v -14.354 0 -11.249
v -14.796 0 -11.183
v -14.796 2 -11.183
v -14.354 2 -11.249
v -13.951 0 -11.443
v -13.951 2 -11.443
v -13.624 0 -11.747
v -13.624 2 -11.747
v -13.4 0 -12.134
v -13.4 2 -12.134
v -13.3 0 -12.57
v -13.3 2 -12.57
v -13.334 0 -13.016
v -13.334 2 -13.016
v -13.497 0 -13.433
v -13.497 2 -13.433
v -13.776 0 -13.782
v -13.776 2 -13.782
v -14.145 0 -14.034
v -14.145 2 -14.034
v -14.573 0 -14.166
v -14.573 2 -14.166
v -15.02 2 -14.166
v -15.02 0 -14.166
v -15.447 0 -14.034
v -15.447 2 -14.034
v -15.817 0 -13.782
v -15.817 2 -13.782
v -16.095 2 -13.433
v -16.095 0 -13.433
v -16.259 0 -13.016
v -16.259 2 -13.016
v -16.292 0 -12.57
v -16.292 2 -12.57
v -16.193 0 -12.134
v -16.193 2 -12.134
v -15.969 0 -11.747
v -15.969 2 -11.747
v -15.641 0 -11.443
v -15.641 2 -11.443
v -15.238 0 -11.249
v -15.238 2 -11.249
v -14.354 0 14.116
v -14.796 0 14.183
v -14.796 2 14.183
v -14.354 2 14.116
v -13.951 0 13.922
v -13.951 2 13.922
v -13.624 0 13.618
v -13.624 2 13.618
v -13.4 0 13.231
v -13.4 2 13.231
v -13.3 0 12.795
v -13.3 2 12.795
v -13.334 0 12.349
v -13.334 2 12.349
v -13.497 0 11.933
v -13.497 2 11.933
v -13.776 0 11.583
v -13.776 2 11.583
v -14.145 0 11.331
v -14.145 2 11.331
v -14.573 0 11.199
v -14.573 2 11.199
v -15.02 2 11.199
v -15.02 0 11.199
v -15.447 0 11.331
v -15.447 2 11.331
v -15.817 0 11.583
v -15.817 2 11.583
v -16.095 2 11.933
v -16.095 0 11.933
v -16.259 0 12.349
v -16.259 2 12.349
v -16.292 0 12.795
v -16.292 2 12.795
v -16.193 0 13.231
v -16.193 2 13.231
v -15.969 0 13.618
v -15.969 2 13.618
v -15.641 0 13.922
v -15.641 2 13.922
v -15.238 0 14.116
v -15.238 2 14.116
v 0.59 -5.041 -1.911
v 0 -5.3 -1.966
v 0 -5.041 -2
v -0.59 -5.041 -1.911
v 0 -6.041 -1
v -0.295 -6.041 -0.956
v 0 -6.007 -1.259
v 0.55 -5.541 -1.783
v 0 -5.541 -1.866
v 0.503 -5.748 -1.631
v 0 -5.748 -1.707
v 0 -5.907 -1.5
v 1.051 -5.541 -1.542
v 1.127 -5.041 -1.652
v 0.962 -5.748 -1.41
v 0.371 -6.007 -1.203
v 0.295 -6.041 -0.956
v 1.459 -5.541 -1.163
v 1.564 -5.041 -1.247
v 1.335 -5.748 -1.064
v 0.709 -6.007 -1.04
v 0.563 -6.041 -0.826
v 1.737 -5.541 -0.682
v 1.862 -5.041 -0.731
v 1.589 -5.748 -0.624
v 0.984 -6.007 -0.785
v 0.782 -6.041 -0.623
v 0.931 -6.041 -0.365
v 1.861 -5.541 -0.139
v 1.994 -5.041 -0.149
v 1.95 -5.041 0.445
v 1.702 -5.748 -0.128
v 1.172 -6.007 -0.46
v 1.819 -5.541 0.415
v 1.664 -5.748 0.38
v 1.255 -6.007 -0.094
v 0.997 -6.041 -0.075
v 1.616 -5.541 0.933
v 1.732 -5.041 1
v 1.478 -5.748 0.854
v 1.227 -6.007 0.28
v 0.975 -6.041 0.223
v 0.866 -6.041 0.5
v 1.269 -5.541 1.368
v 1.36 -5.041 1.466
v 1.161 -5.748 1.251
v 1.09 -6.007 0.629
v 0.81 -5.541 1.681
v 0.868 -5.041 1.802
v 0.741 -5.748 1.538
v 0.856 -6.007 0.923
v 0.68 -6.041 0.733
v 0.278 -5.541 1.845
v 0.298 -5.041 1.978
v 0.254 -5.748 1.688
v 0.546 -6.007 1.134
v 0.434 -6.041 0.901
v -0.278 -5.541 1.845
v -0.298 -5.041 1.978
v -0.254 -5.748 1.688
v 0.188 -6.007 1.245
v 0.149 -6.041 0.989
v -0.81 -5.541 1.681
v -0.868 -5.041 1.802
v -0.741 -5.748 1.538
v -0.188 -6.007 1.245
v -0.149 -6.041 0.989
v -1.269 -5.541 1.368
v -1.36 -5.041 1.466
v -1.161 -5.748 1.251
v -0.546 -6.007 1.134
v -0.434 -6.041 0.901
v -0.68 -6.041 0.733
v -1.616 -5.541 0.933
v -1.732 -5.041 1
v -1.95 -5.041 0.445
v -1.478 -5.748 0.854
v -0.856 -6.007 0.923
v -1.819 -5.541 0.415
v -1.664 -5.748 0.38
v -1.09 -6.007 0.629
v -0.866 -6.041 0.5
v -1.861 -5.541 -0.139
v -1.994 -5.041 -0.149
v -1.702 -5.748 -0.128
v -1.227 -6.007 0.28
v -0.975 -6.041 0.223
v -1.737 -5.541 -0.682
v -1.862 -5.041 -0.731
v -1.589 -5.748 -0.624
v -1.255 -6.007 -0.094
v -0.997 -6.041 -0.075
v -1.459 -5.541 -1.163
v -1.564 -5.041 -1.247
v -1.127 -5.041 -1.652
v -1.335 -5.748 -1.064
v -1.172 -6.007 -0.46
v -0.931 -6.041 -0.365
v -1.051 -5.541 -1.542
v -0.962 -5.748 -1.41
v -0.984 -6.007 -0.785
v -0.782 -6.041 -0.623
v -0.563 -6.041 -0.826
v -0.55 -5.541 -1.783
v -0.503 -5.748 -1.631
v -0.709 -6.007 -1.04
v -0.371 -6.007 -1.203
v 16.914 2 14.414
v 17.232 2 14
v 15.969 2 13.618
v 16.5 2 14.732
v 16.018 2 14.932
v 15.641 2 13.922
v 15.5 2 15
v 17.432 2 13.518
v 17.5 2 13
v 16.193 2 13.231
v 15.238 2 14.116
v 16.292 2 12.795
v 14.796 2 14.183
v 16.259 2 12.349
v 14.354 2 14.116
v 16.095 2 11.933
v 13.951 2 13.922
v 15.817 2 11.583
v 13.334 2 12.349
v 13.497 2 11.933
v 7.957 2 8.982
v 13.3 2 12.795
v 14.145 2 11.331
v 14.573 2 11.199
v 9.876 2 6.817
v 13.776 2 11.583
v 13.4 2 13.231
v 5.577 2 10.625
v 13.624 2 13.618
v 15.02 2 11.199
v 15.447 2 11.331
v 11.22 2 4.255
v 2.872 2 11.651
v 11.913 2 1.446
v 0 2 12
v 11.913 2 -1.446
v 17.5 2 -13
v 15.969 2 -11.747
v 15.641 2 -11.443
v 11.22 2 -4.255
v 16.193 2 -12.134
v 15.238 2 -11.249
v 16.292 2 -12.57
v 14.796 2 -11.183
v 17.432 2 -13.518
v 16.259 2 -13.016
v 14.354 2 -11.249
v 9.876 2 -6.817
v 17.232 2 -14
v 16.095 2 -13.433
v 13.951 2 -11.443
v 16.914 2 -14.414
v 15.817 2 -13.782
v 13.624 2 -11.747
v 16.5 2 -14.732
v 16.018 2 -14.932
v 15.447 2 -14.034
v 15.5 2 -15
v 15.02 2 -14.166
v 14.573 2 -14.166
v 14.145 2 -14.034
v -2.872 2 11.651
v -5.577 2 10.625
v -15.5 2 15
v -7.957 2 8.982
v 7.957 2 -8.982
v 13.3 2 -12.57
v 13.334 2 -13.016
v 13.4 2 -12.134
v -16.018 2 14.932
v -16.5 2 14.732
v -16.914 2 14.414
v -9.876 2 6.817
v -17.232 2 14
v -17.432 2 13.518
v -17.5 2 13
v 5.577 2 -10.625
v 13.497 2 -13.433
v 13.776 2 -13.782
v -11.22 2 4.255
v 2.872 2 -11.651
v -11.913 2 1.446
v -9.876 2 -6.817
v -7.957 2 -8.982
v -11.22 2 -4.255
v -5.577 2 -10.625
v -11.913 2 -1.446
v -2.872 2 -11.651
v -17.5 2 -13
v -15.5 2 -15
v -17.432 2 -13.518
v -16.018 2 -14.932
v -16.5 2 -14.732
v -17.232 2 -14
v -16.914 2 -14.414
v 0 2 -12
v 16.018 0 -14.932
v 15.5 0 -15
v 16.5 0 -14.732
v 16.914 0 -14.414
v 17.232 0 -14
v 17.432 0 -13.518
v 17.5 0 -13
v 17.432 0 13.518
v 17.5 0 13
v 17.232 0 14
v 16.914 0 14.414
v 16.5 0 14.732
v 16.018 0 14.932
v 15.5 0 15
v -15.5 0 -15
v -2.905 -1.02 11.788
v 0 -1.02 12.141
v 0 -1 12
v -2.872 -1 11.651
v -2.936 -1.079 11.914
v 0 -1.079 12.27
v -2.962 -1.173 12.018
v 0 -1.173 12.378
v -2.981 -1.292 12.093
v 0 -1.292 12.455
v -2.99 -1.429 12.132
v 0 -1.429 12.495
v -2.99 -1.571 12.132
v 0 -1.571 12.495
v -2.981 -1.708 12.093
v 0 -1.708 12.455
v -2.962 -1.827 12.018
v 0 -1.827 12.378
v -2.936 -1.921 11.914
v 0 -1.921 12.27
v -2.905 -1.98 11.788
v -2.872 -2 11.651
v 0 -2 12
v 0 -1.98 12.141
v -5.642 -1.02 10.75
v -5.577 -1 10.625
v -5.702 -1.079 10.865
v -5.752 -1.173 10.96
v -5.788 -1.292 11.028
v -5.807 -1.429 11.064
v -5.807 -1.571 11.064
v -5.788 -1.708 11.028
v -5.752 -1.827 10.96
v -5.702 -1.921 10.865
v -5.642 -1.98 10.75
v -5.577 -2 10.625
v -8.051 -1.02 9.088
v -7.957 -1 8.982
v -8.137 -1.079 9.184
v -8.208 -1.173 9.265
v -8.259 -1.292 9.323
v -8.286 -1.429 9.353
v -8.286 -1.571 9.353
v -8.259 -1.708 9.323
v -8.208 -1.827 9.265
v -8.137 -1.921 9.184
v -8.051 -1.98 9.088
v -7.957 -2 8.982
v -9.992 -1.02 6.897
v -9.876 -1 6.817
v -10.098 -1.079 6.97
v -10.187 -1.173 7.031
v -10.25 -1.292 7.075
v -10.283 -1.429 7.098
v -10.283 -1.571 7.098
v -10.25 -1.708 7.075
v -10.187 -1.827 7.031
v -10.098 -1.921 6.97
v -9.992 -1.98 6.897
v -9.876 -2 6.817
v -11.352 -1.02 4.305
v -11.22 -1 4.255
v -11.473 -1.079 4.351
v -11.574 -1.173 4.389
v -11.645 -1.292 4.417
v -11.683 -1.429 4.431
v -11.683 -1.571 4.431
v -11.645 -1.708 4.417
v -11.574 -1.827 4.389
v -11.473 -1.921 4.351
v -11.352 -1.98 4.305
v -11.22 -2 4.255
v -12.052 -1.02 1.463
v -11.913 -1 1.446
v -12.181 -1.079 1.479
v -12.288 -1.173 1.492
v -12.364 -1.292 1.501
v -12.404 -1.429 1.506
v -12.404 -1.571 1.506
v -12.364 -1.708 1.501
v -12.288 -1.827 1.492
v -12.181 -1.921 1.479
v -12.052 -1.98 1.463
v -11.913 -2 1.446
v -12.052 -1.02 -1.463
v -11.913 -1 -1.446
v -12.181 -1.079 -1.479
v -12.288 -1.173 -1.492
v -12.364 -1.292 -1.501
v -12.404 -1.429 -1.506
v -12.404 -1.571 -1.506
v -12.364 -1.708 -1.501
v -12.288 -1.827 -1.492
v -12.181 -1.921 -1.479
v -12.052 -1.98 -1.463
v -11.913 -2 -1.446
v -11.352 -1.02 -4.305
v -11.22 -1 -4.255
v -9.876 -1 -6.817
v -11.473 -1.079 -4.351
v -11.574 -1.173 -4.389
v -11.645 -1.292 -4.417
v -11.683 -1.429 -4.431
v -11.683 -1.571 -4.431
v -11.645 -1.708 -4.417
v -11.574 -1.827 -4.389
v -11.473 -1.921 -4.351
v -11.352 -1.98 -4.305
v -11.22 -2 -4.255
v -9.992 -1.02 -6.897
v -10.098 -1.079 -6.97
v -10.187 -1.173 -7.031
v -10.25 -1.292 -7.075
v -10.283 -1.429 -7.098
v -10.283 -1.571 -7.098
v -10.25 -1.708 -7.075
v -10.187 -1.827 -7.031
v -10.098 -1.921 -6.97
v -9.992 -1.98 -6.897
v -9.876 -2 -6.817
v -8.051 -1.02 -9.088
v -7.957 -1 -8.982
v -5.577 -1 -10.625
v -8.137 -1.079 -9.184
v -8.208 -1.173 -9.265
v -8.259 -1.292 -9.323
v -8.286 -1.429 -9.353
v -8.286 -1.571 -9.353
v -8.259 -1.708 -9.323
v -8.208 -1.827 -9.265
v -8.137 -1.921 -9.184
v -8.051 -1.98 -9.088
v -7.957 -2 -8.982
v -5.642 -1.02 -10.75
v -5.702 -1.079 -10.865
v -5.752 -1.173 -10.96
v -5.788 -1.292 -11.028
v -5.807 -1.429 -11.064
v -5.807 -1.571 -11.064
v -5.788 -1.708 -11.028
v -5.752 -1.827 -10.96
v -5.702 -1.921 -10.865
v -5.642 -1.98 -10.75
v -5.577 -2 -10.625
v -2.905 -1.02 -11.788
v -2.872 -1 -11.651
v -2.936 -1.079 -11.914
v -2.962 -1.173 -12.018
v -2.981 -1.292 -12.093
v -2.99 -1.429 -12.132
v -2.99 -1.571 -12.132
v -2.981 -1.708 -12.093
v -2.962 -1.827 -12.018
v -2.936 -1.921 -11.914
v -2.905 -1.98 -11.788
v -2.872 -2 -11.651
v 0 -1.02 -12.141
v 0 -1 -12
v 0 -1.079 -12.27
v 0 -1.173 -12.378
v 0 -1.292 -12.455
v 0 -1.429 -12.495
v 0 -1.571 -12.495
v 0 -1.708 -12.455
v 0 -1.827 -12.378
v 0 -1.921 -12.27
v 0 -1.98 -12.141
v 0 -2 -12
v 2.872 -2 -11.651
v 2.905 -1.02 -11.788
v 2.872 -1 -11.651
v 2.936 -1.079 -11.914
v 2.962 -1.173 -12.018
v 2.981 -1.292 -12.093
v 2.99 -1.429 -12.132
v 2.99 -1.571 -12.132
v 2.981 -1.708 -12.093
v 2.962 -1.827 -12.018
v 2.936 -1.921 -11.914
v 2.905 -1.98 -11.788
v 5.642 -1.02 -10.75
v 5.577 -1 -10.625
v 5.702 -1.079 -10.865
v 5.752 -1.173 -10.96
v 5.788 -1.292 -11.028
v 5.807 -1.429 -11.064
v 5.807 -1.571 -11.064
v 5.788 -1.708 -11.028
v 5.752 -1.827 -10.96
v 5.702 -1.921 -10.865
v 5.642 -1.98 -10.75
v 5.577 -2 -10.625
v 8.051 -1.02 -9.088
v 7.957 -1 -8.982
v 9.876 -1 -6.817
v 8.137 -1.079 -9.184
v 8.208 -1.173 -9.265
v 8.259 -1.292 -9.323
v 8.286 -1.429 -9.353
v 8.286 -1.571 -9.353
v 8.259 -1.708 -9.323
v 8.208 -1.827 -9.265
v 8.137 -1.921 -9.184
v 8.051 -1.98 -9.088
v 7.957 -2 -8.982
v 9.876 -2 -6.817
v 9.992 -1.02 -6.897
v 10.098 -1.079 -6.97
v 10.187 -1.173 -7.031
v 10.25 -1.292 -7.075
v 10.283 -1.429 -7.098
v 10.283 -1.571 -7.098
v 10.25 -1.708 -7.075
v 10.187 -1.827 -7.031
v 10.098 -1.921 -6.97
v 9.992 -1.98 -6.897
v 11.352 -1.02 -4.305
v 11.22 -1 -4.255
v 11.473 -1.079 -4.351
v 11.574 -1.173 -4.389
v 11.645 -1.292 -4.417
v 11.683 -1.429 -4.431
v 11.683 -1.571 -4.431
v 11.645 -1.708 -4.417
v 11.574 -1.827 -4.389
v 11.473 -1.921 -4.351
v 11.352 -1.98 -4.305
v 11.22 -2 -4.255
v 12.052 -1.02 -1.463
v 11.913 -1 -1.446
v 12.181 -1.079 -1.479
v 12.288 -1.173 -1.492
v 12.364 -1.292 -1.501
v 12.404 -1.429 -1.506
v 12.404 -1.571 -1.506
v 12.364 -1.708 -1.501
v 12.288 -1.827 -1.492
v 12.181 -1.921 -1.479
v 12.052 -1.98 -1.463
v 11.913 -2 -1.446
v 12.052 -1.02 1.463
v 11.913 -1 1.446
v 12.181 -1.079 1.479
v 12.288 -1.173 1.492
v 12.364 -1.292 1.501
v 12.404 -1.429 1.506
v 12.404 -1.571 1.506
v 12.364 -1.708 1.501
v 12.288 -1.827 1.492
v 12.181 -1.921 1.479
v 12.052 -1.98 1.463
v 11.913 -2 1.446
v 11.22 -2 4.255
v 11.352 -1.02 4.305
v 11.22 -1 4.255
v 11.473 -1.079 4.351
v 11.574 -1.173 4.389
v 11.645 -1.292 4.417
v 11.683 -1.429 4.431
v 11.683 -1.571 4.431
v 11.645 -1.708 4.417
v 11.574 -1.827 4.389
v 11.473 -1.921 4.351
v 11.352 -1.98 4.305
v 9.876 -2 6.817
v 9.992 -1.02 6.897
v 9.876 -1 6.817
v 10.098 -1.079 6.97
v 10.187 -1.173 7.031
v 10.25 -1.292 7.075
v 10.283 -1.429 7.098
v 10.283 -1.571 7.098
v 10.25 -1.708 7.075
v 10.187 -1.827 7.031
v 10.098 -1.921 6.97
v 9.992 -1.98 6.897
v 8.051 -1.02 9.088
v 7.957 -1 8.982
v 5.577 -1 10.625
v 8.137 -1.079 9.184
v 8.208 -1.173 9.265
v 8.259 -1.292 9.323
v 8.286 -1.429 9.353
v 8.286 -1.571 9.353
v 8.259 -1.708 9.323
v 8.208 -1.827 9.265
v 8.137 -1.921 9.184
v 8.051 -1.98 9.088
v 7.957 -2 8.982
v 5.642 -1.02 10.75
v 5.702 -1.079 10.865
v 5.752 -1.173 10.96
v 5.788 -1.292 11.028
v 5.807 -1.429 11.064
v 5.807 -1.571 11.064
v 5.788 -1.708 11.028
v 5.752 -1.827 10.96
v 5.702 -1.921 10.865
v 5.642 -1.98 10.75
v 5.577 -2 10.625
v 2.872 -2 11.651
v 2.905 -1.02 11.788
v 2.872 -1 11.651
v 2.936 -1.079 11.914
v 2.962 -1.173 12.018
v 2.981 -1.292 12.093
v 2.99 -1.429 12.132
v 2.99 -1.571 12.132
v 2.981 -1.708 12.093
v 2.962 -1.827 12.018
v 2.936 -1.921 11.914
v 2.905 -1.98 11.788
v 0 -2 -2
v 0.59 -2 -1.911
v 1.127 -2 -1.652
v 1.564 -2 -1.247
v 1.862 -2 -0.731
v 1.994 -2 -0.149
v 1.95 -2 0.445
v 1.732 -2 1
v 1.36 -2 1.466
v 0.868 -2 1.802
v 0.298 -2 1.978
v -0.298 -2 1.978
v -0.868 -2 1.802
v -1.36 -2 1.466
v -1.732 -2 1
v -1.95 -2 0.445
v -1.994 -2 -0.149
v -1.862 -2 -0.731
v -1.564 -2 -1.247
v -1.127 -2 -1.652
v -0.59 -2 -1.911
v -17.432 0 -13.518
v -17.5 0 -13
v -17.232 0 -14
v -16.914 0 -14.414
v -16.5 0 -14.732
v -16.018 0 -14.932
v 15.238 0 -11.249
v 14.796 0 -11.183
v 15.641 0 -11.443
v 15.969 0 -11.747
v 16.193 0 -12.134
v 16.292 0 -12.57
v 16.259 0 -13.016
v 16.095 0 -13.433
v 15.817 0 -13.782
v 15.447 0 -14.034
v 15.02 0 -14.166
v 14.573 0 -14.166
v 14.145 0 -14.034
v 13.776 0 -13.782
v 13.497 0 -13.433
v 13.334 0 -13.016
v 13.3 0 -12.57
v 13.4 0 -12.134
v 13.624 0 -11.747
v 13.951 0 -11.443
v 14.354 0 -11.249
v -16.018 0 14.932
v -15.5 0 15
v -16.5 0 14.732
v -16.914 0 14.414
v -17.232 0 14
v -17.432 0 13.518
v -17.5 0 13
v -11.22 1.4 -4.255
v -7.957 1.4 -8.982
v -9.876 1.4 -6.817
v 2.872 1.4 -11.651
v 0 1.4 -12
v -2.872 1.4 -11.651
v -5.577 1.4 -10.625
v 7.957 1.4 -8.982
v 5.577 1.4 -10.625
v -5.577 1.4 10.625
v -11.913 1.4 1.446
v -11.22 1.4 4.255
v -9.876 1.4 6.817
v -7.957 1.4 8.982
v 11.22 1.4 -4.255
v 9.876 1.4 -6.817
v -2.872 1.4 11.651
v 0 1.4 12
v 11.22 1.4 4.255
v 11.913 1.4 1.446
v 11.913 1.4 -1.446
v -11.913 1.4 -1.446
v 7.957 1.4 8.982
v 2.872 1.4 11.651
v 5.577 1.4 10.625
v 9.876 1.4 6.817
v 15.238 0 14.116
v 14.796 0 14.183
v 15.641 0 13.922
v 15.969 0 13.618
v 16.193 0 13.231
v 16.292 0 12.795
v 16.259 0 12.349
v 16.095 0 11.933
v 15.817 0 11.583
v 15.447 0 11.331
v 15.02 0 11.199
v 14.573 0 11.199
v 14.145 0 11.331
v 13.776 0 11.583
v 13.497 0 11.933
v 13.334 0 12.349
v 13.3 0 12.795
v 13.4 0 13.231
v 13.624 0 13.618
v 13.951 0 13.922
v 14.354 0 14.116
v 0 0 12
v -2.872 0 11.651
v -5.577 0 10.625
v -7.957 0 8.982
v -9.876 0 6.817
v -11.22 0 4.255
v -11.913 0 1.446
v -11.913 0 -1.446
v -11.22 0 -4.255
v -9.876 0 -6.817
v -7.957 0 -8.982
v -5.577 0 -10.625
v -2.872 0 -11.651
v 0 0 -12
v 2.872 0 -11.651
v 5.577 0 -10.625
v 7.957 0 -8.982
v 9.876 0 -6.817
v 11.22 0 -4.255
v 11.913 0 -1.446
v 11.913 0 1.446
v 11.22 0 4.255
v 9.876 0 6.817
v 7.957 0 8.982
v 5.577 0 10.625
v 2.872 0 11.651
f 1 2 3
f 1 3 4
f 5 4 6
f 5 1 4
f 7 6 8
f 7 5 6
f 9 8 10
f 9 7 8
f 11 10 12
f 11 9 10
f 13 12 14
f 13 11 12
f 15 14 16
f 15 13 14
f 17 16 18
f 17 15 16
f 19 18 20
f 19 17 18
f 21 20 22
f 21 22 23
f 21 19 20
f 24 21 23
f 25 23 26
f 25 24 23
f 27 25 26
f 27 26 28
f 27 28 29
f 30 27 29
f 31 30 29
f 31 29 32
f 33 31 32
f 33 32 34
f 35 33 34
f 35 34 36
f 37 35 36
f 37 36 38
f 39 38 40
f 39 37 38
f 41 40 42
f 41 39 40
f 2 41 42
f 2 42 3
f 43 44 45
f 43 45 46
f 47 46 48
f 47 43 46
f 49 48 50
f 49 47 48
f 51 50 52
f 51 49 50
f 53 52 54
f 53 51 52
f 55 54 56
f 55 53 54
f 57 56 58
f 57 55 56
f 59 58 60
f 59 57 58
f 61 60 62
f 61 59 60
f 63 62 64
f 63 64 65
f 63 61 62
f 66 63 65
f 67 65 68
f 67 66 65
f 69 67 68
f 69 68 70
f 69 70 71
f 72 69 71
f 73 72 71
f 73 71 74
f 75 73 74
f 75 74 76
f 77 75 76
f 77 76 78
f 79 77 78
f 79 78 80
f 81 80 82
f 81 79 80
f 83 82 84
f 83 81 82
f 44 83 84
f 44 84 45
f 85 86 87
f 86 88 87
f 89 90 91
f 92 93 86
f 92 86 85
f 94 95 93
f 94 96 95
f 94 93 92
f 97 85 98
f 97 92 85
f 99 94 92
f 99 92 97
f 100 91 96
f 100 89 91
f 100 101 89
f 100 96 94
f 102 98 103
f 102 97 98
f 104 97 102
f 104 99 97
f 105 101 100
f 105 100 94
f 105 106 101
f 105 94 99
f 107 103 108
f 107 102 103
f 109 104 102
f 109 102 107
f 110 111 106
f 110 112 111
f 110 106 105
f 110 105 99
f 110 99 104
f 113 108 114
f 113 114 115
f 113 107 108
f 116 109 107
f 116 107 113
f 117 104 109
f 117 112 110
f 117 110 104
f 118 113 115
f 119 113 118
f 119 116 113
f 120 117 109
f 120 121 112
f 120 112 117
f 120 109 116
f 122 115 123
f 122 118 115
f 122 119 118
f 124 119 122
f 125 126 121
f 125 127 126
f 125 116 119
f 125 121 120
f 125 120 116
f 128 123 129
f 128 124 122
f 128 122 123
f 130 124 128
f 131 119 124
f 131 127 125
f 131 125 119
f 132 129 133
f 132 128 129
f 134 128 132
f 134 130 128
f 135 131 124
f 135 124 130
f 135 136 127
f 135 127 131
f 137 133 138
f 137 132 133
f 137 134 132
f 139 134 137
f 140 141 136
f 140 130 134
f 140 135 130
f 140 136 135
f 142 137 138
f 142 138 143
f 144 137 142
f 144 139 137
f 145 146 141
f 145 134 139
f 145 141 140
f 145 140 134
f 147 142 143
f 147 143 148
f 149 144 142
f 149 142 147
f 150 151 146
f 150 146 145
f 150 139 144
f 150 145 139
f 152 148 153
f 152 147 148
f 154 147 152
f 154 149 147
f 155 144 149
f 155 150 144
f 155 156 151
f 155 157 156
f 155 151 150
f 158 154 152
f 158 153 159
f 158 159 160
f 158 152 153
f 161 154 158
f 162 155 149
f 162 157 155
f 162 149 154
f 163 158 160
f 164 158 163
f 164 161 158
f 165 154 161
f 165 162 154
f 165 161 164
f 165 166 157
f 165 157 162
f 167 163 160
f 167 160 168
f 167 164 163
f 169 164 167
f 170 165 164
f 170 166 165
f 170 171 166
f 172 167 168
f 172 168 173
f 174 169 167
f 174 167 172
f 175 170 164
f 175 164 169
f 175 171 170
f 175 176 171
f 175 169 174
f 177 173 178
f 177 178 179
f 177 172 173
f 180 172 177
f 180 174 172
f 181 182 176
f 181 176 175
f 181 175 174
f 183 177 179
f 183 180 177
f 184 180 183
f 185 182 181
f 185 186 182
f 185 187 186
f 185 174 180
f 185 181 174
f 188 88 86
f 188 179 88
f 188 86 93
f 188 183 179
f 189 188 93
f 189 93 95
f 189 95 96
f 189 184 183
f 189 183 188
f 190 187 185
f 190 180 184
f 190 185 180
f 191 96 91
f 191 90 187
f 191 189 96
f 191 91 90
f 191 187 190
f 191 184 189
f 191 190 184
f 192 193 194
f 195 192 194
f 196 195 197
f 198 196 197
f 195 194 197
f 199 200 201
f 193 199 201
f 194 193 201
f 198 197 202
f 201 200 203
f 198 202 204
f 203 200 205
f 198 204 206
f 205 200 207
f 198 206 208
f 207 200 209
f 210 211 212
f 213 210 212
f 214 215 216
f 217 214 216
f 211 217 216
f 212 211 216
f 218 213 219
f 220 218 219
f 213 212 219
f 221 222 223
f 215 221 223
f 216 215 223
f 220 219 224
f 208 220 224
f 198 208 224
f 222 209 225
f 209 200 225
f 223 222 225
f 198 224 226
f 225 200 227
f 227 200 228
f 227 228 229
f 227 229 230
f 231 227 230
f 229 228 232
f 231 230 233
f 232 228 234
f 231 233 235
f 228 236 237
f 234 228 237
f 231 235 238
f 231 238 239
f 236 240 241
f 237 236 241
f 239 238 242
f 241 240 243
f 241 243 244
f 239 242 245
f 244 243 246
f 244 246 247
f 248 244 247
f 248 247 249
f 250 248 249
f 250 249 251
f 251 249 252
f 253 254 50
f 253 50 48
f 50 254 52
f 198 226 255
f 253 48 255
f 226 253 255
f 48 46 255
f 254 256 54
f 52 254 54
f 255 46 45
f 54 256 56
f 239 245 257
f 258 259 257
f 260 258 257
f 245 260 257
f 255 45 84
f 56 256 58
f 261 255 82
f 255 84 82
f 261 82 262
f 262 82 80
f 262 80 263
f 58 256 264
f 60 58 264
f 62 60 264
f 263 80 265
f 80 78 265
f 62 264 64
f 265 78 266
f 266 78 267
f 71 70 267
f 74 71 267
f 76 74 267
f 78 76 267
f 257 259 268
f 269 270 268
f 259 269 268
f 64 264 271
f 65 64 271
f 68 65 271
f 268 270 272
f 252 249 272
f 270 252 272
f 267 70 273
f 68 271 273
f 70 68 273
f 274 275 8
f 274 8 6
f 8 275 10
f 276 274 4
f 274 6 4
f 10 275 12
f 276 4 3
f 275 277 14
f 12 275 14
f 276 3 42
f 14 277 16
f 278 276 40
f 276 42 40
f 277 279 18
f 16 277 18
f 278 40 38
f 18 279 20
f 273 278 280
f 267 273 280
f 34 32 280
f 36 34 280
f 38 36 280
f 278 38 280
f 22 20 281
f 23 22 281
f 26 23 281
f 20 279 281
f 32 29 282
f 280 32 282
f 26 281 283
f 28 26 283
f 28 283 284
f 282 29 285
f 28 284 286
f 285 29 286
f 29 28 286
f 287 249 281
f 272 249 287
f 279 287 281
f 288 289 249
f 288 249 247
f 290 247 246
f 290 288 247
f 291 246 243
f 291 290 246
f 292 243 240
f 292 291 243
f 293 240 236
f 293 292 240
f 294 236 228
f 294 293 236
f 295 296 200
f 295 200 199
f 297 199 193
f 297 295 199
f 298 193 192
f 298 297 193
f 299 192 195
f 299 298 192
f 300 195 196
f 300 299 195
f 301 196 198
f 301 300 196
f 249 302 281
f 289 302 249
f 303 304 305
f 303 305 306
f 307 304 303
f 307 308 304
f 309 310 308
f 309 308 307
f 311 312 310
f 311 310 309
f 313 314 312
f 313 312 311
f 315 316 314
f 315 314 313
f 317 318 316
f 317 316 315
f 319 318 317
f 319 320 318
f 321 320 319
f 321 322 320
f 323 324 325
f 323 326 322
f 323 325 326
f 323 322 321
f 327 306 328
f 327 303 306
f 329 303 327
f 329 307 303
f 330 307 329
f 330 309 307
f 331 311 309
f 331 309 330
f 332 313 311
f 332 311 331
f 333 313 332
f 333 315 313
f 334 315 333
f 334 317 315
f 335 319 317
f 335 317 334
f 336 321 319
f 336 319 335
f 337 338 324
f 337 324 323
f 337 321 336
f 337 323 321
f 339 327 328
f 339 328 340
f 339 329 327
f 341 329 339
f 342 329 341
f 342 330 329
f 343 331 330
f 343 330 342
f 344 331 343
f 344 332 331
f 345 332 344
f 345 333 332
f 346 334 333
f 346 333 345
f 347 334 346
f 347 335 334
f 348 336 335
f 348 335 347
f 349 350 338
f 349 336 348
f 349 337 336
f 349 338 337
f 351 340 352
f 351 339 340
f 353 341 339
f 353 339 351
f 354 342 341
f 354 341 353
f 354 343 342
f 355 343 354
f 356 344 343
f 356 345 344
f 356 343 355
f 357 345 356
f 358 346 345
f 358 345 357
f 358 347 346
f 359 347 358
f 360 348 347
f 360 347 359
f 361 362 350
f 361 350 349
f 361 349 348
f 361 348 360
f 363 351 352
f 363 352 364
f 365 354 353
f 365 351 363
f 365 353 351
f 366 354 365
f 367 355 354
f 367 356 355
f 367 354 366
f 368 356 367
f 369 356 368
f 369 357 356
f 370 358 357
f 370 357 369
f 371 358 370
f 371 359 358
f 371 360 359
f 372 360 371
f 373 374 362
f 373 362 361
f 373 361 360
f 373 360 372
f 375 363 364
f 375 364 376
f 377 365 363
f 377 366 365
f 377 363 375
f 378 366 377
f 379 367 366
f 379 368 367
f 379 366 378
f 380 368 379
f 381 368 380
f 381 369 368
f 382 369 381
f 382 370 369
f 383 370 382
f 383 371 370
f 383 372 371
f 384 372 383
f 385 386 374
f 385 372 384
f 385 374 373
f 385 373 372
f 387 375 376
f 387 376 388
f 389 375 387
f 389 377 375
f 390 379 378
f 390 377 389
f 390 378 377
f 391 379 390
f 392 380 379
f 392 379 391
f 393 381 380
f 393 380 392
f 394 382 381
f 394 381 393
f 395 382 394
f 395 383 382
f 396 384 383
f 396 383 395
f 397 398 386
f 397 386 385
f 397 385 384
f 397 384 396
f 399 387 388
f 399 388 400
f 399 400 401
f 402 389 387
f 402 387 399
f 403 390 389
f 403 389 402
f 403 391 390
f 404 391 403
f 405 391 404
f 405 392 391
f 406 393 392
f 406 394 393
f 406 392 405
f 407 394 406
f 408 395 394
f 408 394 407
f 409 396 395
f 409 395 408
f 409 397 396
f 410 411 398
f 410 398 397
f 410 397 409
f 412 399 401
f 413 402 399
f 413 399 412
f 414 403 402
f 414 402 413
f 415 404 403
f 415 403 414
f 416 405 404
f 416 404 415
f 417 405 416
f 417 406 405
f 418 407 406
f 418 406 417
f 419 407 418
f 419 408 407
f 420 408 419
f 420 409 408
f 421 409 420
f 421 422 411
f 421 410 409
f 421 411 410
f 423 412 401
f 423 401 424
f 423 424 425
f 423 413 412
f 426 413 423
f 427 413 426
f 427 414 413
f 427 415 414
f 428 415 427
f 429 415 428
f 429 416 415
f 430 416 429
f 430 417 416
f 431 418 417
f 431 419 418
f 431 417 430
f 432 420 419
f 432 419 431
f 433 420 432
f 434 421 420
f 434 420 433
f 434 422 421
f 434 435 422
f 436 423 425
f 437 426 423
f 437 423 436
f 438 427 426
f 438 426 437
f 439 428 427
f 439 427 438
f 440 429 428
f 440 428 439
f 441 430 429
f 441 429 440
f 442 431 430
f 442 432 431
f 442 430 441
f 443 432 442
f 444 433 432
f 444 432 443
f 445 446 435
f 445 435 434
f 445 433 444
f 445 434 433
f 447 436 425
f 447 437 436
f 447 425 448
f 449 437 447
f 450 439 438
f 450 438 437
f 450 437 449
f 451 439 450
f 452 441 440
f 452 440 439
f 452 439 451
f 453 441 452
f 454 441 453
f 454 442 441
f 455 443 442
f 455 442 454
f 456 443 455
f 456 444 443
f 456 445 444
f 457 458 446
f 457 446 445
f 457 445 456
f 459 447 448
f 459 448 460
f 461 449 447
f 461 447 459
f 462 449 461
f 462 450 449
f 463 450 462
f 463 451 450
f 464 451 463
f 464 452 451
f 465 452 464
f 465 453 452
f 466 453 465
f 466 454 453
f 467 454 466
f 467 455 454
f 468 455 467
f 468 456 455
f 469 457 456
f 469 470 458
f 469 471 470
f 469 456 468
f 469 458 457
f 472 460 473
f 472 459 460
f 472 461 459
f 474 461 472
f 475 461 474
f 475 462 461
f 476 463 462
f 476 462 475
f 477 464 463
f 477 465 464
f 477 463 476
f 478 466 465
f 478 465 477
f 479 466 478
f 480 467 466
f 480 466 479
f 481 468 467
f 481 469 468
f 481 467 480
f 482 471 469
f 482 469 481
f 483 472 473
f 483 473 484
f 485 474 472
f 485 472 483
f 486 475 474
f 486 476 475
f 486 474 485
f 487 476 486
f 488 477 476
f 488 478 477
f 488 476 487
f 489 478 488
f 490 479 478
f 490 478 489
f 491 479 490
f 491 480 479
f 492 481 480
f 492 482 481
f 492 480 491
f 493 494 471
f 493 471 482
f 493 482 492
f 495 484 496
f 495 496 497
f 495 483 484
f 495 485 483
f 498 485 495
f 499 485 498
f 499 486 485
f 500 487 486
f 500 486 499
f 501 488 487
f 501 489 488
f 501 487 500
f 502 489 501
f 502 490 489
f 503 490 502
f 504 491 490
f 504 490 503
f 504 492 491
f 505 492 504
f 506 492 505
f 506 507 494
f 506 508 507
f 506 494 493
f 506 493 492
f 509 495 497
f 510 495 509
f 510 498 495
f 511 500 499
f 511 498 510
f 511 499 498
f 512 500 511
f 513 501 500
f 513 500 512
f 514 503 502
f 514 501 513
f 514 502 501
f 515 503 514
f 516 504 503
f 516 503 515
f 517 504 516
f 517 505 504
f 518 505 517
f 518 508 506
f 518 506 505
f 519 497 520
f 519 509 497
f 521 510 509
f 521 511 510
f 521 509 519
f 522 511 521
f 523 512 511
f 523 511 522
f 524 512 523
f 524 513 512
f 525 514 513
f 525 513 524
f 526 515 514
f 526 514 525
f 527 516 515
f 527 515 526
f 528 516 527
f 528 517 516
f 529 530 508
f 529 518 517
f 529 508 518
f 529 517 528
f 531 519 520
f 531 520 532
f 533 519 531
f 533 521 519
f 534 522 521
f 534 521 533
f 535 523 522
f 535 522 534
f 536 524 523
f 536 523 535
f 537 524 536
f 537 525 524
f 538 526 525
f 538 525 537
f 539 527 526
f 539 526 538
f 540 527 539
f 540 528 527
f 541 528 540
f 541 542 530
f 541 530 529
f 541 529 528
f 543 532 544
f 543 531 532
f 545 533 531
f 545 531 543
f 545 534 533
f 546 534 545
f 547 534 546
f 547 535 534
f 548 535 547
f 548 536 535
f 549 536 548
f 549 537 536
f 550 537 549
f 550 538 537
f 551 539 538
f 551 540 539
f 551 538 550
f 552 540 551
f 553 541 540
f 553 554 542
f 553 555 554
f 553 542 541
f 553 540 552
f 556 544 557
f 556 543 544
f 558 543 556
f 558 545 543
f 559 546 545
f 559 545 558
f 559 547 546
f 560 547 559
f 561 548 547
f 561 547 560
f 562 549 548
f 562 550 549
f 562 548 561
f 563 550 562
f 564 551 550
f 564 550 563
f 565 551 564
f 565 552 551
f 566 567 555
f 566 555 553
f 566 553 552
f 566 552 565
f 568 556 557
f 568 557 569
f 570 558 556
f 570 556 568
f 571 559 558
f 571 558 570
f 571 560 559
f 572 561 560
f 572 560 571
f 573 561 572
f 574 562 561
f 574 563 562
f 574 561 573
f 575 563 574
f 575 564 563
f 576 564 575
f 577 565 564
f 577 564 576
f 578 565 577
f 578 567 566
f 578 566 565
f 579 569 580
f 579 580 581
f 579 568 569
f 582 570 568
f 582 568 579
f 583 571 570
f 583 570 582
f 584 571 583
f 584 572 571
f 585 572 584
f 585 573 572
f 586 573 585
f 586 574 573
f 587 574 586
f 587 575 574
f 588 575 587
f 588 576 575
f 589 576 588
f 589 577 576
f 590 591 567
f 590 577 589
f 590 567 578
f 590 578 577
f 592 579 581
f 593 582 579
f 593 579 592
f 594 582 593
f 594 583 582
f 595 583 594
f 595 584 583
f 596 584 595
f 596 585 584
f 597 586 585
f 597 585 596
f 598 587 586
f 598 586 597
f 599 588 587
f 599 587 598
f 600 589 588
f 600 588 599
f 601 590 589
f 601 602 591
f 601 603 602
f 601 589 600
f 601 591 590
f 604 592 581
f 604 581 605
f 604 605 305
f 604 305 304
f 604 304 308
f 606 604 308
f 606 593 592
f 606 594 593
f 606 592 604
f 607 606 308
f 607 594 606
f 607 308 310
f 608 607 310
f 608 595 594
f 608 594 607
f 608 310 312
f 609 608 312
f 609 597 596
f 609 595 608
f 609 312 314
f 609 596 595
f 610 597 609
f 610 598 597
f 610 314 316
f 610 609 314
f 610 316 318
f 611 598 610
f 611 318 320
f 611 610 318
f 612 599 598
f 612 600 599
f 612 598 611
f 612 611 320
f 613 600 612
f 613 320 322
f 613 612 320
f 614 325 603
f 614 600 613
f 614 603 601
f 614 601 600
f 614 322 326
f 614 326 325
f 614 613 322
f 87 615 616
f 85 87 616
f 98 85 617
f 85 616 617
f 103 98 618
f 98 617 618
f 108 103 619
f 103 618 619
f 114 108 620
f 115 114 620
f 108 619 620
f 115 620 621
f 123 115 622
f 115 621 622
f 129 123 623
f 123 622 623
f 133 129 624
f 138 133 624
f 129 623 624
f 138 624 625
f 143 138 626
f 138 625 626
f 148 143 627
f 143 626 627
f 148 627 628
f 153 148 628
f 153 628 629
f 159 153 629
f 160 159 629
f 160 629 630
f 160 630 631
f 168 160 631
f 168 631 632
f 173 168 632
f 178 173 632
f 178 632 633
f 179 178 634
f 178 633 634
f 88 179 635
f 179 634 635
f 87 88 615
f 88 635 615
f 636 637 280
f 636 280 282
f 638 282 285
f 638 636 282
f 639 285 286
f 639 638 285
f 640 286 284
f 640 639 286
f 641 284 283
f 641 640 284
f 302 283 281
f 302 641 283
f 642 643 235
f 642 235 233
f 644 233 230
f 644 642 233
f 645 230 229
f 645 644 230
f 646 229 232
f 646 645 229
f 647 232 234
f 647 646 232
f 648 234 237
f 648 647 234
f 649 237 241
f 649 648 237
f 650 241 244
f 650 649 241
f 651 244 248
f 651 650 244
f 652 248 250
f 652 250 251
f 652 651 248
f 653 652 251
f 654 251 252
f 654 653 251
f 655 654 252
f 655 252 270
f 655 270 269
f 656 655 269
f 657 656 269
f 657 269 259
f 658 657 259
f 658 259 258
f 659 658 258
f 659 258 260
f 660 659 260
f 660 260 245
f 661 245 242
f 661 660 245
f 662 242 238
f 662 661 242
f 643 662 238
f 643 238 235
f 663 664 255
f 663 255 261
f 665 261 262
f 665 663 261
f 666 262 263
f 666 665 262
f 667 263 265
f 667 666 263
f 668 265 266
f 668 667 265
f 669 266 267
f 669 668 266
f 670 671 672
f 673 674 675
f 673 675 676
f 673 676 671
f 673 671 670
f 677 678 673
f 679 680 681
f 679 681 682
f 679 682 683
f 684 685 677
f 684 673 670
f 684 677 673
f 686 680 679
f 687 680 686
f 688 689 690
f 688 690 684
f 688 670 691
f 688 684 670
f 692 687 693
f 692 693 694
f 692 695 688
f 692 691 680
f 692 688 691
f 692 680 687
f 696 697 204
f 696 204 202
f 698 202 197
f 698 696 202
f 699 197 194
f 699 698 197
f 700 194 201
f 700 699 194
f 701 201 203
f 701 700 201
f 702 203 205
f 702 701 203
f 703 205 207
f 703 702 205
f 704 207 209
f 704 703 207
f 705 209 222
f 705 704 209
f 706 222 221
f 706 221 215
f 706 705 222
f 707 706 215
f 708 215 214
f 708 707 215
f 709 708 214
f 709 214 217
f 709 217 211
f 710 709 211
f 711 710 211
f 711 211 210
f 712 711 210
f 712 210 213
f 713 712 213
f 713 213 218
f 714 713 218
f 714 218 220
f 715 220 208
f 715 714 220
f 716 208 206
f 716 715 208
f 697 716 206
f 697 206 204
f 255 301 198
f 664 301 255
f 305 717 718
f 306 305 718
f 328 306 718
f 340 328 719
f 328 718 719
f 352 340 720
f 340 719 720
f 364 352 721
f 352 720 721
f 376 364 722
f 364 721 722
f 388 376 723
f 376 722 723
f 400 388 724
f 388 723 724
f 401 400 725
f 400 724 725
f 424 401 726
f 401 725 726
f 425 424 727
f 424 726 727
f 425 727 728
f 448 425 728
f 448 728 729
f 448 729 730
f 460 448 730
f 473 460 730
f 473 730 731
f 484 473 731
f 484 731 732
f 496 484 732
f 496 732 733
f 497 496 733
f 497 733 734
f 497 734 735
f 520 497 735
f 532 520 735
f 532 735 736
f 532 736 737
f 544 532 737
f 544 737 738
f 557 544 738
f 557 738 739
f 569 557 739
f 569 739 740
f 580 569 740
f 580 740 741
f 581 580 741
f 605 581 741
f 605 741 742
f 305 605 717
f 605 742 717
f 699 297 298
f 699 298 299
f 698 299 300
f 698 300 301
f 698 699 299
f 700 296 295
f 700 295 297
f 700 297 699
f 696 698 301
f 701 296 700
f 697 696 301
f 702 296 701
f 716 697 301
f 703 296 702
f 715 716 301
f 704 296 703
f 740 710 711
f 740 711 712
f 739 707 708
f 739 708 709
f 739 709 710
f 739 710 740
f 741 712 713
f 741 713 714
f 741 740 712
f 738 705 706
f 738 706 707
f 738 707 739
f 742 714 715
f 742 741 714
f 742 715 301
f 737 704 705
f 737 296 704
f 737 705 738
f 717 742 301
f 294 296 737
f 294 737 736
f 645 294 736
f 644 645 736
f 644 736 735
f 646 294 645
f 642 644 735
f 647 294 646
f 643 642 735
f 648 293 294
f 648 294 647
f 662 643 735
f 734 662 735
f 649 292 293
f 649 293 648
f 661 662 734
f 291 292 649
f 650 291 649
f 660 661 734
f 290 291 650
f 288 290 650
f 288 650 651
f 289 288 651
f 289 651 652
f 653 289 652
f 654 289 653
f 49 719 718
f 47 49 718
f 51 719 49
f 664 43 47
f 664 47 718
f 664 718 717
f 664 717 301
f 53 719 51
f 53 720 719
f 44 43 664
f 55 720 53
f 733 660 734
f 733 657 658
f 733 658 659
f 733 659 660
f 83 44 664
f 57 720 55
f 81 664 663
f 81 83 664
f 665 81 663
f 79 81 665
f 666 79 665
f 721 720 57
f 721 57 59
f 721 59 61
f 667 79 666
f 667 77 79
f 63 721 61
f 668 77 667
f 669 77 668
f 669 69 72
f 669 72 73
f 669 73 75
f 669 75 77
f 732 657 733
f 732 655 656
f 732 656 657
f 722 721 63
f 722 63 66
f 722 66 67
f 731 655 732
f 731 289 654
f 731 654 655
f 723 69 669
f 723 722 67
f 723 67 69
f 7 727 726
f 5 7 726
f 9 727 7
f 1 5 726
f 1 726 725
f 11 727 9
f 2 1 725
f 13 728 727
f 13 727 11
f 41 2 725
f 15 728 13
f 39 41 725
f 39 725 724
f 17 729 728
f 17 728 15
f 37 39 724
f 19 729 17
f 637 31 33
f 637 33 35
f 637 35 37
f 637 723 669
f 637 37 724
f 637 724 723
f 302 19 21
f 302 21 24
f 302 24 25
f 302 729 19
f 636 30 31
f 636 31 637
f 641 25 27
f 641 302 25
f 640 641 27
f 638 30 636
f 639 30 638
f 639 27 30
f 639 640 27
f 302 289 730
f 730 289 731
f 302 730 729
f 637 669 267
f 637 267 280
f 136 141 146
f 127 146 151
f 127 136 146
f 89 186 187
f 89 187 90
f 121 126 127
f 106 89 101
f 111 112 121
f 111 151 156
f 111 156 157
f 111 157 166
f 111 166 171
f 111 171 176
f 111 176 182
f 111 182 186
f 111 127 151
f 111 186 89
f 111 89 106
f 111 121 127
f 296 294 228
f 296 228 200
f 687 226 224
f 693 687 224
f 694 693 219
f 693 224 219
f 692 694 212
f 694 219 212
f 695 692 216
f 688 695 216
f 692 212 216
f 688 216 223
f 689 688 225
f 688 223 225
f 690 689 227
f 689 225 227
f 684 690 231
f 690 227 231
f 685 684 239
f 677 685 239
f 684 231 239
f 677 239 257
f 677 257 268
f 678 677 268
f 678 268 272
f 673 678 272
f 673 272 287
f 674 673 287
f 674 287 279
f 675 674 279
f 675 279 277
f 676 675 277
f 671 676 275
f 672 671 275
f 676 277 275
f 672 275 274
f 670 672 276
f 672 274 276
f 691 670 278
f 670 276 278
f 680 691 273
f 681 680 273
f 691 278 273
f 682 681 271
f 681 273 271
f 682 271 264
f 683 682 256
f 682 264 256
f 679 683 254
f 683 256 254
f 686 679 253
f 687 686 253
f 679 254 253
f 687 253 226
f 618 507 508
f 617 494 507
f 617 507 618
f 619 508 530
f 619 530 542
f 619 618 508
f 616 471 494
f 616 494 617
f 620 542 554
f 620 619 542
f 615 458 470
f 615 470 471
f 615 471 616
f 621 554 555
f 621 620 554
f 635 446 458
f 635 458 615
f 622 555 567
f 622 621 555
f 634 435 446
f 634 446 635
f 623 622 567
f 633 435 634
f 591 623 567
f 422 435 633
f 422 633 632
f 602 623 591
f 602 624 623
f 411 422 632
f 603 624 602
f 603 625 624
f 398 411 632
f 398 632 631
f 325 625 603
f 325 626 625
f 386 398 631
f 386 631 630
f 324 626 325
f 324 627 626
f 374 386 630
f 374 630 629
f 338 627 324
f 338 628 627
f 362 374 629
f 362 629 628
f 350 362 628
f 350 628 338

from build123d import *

# Parameters (mm, degrees)
SKETCH1_R           = 1.5
BOSS_EXTRUDE2_DEPTH = 2
SKETCH3_R           = 12
BOSS_EXTRUDE3_DEPTH = 2
SKETCH4_R           = 0.5
SKETCH5_R           = 2
BOSS_EXTRUDE4_DEPTH = 4.040735944
FILLET1_R           = 1
SKETCH7_R           = 12
CUT_EXTRUDE3_DEPTH  = 0.6


with BuildPart() as part:
    # Sketch1 → Boss-Extrude2 (new body)
    with BuildSketch(Plane(origin=(0, 0, 0), x_dir=(1, 0, 0), z_dir=(0, 1, 0))):
        with BuildLine():
            Line((-15.5, 15), (15.5, 15))
            ThreePointArc((15.5, 15), (16.914213562, 14.414213562), (17.5, 13))
            Line((17.5, 13), (17.5, -13))
            ThreePointArc((17.5, -13), (16.914213562, -14.414213562), (15.5, -15))
            Line((15.5, -15), (-15.5, -15))
            ThreePointArc((-15.5, -15), (-16.914213562, -14.414213562), (-17.5, -13))
            Line((-17.5, -13), (-17.5, 13))
            ThreePointArc((-17.5, 13), (-16.914213562, 14.414213562), (-15.5, 15))
        make_face()
        with Locations(Location((-14.79625841, 12.682507209, 0), (0, 0, 270))):
            Circle(SKETCH1_R, mode=Mode.SUBTRACT)
        with Locations(Location((-14.79625841, -12.682507209, 0), (0, 0, 270))):
            Circle(SKETCH1_R, mode=Mode.SUBTRACT)
        with Locations(Location((14.79625841, 12.682507209, 0), (0, 0, 270))):
            Circle(SKETCH1_R, mode=Mode.SUBTRACT)
        with Locations(Location((14.79625841, -12.682507209, 0), (0, 0, 270))):
            Circle(SKETCH1_R, mode=Mode.SUBTRACT)
    extrude(amount=BOSS_EXTRUDE2_DEPTH)

    # Sketch3 → Boss-Extrude3 (add)
    with BuildSketch(Plane.XZ):
        with Locations(Location((0, 0, 0), (0, 0, 90))):
            Circle(SKETCH3_R)
    extrude(amount=BOSS_EXTRUDE3_DEPTH)

    # Sketch4 → Revolve1 (revolve)
    with BuildSketch(Plane(origin=(0, 0, 0), x_dir=(0, 0, -1), z_dir=(1, 0, 0))):
        with Locations((-12, -1.5)):
            Circle(SKETCH4_R)
    revolve(axis=Axis((0, 0, 0), (0, -1, 0)))

    # Sketch5 → Boss-Extrude4 (add)
    with BuildSketch(Plane.XZ.offset(2)):
        with Locations(Location((0, 0, 0), (0, 0, 270))):
            Circle(SKETCH5_R)
    extrude(amount=BOSS_EXTRUDE4_DEPTH)

    # Fillet1
    fillet1_edges = [part.edges().sort_by_distance(p)[0] for p in [
        (0, -6.040735944, 2),
    ]]
    fillet(fillet1_edges, radius=FILLET1_R)

    # Sketch7 → Cut-Extrude3 (cut)
    with BuildSketch(Plane(origin=(0, 2, 0), x_dir=(1, 0, 0), z_dir=(0, 1, 0))):
        with Locations(Location((0, 0, 0), (0, 0, 270))):
            Circle(SKETCH7_R)
    extrude(amount=-CUT_EXTRUDE3_DEPTH, mode=Mode.SUBTRACT)


solid = part.part
